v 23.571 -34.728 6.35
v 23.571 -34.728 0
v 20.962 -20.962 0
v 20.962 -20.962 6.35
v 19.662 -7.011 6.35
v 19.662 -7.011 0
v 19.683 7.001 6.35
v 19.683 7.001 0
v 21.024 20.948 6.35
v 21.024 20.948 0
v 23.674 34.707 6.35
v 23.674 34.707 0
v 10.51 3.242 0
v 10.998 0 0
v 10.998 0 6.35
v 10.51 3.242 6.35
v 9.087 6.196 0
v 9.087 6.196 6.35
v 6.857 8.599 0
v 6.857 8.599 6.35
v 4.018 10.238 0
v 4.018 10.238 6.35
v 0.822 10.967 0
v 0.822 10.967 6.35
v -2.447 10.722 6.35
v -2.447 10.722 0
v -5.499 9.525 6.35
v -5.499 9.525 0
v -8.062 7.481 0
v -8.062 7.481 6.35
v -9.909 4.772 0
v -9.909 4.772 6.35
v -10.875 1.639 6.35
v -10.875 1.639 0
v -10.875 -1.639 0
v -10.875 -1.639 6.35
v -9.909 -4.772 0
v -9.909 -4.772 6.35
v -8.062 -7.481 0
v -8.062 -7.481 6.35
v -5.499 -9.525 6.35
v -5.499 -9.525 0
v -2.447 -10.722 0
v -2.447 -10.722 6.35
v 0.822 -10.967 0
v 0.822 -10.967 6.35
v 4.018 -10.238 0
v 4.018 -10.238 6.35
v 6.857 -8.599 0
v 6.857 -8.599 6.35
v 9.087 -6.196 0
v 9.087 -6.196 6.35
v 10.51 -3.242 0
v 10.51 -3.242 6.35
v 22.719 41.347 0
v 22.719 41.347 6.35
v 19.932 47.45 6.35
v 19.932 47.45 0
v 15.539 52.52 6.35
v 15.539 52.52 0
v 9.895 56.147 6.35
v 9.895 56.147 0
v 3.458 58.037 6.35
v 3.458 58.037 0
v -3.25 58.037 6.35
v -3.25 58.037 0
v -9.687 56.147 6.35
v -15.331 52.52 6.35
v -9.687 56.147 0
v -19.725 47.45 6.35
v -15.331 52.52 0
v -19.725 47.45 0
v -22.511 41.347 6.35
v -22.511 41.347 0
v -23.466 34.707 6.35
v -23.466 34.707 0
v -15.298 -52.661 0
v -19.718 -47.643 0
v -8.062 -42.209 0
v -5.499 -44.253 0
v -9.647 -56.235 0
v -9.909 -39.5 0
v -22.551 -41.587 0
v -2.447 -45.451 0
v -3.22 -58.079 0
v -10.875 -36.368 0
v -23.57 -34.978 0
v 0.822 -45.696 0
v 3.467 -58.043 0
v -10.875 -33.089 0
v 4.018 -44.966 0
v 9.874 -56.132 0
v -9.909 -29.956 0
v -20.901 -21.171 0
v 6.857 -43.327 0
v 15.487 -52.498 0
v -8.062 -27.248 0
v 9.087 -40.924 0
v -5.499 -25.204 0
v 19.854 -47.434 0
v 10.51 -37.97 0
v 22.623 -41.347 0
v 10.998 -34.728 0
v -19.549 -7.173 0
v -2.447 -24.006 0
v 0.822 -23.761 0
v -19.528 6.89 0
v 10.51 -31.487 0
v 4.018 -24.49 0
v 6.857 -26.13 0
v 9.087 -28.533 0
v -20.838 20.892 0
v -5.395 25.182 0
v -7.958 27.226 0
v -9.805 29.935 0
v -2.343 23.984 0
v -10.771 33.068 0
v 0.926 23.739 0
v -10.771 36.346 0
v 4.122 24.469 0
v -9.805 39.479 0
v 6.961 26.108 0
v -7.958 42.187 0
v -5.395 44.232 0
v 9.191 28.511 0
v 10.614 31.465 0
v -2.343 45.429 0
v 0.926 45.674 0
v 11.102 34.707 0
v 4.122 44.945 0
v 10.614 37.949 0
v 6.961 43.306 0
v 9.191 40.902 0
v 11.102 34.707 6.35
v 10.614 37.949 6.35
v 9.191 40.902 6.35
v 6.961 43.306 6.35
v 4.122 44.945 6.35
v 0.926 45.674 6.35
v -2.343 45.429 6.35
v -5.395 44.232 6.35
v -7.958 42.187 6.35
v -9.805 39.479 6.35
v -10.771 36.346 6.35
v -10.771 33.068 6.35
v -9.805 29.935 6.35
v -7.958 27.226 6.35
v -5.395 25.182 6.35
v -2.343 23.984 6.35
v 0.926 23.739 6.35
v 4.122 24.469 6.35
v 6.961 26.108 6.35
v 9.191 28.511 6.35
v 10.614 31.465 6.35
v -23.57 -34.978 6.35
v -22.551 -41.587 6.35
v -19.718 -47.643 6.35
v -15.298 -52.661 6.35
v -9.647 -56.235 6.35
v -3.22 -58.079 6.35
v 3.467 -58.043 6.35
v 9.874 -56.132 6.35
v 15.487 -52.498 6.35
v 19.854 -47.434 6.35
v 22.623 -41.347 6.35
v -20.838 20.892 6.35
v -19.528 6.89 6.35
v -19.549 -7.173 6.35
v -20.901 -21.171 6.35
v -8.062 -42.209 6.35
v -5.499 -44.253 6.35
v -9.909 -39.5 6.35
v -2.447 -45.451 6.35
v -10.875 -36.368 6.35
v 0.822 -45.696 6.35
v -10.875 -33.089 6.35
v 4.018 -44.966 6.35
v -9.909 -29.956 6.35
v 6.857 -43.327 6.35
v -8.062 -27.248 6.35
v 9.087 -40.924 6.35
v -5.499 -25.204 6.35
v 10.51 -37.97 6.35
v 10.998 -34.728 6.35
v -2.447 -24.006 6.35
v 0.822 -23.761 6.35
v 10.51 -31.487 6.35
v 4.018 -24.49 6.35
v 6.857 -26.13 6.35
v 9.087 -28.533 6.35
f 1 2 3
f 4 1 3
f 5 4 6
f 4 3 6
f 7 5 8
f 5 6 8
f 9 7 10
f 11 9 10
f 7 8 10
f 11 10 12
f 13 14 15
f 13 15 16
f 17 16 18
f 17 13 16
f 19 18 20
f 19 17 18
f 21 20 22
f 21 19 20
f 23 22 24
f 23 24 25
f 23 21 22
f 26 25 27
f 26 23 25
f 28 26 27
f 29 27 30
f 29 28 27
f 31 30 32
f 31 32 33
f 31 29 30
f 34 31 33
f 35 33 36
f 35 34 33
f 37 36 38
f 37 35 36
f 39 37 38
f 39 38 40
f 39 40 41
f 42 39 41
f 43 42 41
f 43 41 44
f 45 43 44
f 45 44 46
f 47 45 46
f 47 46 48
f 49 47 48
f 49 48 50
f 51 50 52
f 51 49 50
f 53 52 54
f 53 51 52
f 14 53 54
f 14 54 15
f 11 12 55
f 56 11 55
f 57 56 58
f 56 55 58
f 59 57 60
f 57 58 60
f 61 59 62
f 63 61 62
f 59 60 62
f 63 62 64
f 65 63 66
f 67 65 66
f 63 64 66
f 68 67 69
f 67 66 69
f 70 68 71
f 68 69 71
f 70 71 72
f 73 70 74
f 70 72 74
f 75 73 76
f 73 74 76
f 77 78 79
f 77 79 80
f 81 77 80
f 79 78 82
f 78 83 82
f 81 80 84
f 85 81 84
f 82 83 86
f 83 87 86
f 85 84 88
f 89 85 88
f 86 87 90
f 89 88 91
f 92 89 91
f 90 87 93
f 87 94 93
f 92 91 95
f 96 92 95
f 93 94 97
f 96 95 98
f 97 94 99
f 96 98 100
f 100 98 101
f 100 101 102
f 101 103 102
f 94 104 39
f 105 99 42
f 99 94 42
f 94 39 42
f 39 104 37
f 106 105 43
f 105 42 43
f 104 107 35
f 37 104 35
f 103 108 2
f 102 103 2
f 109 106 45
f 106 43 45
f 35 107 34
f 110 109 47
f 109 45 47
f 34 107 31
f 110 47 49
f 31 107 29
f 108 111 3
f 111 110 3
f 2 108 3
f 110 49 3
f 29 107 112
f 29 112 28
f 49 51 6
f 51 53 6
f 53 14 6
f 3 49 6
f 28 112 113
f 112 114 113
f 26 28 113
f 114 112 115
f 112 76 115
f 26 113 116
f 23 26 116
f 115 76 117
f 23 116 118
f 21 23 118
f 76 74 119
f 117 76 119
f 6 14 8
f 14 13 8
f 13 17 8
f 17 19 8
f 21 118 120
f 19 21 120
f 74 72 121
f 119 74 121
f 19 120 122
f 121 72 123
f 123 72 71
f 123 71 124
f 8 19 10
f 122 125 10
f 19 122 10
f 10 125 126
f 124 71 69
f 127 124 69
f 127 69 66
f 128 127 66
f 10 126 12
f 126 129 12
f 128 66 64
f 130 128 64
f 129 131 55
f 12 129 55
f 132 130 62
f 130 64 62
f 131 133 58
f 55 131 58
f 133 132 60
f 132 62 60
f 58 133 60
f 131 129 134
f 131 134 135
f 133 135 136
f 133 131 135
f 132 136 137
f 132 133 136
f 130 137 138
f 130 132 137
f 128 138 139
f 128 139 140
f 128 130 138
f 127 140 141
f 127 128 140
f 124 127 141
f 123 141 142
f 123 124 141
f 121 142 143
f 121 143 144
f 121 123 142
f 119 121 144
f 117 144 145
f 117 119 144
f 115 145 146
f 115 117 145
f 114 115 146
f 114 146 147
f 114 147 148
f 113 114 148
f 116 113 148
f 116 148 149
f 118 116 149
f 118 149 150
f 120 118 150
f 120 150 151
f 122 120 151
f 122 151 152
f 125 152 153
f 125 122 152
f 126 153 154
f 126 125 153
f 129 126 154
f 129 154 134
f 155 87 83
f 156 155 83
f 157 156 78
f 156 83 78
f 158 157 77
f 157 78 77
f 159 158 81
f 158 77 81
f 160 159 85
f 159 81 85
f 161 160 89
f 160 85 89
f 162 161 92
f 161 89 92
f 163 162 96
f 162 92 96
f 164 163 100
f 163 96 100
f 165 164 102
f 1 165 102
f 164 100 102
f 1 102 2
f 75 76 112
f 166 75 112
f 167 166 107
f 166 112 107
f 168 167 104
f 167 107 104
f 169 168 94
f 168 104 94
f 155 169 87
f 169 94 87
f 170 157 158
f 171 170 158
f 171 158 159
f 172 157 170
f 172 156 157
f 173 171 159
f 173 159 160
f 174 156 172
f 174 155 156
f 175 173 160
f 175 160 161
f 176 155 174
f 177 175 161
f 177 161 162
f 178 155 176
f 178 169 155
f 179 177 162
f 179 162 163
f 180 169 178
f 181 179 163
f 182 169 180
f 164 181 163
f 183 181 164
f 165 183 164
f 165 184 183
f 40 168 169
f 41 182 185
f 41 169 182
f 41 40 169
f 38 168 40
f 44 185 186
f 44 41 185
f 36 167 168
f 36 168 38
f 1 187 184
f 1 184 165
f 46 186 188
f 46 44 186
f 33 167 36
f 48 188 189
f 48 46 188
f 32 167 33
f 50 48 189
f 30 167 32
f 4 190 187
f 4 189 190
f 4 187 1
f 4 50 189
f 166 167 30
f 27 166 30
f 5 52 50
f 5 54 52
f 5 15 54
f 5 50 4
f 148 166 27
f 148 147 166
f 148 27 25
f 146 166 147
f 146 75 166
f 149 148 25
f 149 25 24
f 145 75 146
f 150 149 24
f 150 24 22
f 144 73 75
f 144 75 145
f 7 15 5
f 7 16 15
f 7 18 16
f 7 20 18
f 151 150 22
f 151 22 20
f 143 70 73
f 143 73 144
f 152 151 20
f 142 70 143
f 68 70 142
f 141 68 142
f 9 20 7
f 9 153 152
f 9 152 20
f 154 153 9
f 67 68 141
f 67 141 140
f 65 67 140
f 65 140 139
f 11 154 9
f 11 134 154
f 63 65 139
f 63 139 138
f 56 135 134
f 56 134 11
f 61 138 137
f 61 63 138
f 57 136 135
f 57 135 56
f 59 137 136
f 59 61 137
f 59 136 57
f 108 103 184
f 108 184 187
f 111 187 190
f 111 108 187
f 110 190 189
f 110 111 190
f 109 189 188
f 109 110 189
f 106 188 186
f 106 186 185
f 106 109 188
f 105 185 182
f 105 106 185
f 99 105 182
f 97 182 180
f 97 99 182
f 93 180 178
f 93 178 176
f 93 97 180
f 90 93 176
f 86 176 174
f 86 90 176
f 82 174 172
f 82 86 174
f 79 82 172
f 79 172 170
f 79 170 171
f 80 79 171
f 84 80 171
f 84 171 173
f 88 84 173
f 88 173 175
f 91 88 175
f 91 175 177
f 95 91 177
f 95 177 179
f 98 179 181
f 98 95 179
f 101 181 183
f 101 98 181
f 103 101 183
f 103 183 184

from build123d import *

# Parameters (mm, degrees)
F0_R     = 10.9982
F1_DEPTH = 6.35


# Not quite as in the source:
# - a feature names something its author has since deleted; it is built from what else it names


with BuildPart() as f1:
    # F0 (on Top) → F1 (new body)
    with BuildSketch(Plane.XY):
        with BuildLine():
            ThreePointArc((23.5712, -34.728333354), (19.5070052041, -0.0046640159), (23.674090089, 34.706808082))
            ThreePointArc((23.674090089, 34.706808082), (0.1039423202, 58.2769558508), (-23.4662054486, 34.706808082))
            ThreePointArc((-23.4662054486, 34.706808082), (-19.3723117522, -0.1418189062), (-23.569876554, -34.9781105903))
            ThreePointArc((-23.569876554, -34.9781105903), (0.1248903712, -58.2992024902), (23.5712, -34.728333354))
        make_face()
        with Locations((0, -34.728333354)):
            Circle(F0_R, mode=Mode.SUBTRACT)
        Circle(F0_R, mode=Mode.SUBTRACT)
        with Locations((0.1039423202, 34.706808082)):
            Circle(F0_R, mode=Mode.SUBTRACT)
    extrude(amount=F1_DEPTH)


solid = f1.part
